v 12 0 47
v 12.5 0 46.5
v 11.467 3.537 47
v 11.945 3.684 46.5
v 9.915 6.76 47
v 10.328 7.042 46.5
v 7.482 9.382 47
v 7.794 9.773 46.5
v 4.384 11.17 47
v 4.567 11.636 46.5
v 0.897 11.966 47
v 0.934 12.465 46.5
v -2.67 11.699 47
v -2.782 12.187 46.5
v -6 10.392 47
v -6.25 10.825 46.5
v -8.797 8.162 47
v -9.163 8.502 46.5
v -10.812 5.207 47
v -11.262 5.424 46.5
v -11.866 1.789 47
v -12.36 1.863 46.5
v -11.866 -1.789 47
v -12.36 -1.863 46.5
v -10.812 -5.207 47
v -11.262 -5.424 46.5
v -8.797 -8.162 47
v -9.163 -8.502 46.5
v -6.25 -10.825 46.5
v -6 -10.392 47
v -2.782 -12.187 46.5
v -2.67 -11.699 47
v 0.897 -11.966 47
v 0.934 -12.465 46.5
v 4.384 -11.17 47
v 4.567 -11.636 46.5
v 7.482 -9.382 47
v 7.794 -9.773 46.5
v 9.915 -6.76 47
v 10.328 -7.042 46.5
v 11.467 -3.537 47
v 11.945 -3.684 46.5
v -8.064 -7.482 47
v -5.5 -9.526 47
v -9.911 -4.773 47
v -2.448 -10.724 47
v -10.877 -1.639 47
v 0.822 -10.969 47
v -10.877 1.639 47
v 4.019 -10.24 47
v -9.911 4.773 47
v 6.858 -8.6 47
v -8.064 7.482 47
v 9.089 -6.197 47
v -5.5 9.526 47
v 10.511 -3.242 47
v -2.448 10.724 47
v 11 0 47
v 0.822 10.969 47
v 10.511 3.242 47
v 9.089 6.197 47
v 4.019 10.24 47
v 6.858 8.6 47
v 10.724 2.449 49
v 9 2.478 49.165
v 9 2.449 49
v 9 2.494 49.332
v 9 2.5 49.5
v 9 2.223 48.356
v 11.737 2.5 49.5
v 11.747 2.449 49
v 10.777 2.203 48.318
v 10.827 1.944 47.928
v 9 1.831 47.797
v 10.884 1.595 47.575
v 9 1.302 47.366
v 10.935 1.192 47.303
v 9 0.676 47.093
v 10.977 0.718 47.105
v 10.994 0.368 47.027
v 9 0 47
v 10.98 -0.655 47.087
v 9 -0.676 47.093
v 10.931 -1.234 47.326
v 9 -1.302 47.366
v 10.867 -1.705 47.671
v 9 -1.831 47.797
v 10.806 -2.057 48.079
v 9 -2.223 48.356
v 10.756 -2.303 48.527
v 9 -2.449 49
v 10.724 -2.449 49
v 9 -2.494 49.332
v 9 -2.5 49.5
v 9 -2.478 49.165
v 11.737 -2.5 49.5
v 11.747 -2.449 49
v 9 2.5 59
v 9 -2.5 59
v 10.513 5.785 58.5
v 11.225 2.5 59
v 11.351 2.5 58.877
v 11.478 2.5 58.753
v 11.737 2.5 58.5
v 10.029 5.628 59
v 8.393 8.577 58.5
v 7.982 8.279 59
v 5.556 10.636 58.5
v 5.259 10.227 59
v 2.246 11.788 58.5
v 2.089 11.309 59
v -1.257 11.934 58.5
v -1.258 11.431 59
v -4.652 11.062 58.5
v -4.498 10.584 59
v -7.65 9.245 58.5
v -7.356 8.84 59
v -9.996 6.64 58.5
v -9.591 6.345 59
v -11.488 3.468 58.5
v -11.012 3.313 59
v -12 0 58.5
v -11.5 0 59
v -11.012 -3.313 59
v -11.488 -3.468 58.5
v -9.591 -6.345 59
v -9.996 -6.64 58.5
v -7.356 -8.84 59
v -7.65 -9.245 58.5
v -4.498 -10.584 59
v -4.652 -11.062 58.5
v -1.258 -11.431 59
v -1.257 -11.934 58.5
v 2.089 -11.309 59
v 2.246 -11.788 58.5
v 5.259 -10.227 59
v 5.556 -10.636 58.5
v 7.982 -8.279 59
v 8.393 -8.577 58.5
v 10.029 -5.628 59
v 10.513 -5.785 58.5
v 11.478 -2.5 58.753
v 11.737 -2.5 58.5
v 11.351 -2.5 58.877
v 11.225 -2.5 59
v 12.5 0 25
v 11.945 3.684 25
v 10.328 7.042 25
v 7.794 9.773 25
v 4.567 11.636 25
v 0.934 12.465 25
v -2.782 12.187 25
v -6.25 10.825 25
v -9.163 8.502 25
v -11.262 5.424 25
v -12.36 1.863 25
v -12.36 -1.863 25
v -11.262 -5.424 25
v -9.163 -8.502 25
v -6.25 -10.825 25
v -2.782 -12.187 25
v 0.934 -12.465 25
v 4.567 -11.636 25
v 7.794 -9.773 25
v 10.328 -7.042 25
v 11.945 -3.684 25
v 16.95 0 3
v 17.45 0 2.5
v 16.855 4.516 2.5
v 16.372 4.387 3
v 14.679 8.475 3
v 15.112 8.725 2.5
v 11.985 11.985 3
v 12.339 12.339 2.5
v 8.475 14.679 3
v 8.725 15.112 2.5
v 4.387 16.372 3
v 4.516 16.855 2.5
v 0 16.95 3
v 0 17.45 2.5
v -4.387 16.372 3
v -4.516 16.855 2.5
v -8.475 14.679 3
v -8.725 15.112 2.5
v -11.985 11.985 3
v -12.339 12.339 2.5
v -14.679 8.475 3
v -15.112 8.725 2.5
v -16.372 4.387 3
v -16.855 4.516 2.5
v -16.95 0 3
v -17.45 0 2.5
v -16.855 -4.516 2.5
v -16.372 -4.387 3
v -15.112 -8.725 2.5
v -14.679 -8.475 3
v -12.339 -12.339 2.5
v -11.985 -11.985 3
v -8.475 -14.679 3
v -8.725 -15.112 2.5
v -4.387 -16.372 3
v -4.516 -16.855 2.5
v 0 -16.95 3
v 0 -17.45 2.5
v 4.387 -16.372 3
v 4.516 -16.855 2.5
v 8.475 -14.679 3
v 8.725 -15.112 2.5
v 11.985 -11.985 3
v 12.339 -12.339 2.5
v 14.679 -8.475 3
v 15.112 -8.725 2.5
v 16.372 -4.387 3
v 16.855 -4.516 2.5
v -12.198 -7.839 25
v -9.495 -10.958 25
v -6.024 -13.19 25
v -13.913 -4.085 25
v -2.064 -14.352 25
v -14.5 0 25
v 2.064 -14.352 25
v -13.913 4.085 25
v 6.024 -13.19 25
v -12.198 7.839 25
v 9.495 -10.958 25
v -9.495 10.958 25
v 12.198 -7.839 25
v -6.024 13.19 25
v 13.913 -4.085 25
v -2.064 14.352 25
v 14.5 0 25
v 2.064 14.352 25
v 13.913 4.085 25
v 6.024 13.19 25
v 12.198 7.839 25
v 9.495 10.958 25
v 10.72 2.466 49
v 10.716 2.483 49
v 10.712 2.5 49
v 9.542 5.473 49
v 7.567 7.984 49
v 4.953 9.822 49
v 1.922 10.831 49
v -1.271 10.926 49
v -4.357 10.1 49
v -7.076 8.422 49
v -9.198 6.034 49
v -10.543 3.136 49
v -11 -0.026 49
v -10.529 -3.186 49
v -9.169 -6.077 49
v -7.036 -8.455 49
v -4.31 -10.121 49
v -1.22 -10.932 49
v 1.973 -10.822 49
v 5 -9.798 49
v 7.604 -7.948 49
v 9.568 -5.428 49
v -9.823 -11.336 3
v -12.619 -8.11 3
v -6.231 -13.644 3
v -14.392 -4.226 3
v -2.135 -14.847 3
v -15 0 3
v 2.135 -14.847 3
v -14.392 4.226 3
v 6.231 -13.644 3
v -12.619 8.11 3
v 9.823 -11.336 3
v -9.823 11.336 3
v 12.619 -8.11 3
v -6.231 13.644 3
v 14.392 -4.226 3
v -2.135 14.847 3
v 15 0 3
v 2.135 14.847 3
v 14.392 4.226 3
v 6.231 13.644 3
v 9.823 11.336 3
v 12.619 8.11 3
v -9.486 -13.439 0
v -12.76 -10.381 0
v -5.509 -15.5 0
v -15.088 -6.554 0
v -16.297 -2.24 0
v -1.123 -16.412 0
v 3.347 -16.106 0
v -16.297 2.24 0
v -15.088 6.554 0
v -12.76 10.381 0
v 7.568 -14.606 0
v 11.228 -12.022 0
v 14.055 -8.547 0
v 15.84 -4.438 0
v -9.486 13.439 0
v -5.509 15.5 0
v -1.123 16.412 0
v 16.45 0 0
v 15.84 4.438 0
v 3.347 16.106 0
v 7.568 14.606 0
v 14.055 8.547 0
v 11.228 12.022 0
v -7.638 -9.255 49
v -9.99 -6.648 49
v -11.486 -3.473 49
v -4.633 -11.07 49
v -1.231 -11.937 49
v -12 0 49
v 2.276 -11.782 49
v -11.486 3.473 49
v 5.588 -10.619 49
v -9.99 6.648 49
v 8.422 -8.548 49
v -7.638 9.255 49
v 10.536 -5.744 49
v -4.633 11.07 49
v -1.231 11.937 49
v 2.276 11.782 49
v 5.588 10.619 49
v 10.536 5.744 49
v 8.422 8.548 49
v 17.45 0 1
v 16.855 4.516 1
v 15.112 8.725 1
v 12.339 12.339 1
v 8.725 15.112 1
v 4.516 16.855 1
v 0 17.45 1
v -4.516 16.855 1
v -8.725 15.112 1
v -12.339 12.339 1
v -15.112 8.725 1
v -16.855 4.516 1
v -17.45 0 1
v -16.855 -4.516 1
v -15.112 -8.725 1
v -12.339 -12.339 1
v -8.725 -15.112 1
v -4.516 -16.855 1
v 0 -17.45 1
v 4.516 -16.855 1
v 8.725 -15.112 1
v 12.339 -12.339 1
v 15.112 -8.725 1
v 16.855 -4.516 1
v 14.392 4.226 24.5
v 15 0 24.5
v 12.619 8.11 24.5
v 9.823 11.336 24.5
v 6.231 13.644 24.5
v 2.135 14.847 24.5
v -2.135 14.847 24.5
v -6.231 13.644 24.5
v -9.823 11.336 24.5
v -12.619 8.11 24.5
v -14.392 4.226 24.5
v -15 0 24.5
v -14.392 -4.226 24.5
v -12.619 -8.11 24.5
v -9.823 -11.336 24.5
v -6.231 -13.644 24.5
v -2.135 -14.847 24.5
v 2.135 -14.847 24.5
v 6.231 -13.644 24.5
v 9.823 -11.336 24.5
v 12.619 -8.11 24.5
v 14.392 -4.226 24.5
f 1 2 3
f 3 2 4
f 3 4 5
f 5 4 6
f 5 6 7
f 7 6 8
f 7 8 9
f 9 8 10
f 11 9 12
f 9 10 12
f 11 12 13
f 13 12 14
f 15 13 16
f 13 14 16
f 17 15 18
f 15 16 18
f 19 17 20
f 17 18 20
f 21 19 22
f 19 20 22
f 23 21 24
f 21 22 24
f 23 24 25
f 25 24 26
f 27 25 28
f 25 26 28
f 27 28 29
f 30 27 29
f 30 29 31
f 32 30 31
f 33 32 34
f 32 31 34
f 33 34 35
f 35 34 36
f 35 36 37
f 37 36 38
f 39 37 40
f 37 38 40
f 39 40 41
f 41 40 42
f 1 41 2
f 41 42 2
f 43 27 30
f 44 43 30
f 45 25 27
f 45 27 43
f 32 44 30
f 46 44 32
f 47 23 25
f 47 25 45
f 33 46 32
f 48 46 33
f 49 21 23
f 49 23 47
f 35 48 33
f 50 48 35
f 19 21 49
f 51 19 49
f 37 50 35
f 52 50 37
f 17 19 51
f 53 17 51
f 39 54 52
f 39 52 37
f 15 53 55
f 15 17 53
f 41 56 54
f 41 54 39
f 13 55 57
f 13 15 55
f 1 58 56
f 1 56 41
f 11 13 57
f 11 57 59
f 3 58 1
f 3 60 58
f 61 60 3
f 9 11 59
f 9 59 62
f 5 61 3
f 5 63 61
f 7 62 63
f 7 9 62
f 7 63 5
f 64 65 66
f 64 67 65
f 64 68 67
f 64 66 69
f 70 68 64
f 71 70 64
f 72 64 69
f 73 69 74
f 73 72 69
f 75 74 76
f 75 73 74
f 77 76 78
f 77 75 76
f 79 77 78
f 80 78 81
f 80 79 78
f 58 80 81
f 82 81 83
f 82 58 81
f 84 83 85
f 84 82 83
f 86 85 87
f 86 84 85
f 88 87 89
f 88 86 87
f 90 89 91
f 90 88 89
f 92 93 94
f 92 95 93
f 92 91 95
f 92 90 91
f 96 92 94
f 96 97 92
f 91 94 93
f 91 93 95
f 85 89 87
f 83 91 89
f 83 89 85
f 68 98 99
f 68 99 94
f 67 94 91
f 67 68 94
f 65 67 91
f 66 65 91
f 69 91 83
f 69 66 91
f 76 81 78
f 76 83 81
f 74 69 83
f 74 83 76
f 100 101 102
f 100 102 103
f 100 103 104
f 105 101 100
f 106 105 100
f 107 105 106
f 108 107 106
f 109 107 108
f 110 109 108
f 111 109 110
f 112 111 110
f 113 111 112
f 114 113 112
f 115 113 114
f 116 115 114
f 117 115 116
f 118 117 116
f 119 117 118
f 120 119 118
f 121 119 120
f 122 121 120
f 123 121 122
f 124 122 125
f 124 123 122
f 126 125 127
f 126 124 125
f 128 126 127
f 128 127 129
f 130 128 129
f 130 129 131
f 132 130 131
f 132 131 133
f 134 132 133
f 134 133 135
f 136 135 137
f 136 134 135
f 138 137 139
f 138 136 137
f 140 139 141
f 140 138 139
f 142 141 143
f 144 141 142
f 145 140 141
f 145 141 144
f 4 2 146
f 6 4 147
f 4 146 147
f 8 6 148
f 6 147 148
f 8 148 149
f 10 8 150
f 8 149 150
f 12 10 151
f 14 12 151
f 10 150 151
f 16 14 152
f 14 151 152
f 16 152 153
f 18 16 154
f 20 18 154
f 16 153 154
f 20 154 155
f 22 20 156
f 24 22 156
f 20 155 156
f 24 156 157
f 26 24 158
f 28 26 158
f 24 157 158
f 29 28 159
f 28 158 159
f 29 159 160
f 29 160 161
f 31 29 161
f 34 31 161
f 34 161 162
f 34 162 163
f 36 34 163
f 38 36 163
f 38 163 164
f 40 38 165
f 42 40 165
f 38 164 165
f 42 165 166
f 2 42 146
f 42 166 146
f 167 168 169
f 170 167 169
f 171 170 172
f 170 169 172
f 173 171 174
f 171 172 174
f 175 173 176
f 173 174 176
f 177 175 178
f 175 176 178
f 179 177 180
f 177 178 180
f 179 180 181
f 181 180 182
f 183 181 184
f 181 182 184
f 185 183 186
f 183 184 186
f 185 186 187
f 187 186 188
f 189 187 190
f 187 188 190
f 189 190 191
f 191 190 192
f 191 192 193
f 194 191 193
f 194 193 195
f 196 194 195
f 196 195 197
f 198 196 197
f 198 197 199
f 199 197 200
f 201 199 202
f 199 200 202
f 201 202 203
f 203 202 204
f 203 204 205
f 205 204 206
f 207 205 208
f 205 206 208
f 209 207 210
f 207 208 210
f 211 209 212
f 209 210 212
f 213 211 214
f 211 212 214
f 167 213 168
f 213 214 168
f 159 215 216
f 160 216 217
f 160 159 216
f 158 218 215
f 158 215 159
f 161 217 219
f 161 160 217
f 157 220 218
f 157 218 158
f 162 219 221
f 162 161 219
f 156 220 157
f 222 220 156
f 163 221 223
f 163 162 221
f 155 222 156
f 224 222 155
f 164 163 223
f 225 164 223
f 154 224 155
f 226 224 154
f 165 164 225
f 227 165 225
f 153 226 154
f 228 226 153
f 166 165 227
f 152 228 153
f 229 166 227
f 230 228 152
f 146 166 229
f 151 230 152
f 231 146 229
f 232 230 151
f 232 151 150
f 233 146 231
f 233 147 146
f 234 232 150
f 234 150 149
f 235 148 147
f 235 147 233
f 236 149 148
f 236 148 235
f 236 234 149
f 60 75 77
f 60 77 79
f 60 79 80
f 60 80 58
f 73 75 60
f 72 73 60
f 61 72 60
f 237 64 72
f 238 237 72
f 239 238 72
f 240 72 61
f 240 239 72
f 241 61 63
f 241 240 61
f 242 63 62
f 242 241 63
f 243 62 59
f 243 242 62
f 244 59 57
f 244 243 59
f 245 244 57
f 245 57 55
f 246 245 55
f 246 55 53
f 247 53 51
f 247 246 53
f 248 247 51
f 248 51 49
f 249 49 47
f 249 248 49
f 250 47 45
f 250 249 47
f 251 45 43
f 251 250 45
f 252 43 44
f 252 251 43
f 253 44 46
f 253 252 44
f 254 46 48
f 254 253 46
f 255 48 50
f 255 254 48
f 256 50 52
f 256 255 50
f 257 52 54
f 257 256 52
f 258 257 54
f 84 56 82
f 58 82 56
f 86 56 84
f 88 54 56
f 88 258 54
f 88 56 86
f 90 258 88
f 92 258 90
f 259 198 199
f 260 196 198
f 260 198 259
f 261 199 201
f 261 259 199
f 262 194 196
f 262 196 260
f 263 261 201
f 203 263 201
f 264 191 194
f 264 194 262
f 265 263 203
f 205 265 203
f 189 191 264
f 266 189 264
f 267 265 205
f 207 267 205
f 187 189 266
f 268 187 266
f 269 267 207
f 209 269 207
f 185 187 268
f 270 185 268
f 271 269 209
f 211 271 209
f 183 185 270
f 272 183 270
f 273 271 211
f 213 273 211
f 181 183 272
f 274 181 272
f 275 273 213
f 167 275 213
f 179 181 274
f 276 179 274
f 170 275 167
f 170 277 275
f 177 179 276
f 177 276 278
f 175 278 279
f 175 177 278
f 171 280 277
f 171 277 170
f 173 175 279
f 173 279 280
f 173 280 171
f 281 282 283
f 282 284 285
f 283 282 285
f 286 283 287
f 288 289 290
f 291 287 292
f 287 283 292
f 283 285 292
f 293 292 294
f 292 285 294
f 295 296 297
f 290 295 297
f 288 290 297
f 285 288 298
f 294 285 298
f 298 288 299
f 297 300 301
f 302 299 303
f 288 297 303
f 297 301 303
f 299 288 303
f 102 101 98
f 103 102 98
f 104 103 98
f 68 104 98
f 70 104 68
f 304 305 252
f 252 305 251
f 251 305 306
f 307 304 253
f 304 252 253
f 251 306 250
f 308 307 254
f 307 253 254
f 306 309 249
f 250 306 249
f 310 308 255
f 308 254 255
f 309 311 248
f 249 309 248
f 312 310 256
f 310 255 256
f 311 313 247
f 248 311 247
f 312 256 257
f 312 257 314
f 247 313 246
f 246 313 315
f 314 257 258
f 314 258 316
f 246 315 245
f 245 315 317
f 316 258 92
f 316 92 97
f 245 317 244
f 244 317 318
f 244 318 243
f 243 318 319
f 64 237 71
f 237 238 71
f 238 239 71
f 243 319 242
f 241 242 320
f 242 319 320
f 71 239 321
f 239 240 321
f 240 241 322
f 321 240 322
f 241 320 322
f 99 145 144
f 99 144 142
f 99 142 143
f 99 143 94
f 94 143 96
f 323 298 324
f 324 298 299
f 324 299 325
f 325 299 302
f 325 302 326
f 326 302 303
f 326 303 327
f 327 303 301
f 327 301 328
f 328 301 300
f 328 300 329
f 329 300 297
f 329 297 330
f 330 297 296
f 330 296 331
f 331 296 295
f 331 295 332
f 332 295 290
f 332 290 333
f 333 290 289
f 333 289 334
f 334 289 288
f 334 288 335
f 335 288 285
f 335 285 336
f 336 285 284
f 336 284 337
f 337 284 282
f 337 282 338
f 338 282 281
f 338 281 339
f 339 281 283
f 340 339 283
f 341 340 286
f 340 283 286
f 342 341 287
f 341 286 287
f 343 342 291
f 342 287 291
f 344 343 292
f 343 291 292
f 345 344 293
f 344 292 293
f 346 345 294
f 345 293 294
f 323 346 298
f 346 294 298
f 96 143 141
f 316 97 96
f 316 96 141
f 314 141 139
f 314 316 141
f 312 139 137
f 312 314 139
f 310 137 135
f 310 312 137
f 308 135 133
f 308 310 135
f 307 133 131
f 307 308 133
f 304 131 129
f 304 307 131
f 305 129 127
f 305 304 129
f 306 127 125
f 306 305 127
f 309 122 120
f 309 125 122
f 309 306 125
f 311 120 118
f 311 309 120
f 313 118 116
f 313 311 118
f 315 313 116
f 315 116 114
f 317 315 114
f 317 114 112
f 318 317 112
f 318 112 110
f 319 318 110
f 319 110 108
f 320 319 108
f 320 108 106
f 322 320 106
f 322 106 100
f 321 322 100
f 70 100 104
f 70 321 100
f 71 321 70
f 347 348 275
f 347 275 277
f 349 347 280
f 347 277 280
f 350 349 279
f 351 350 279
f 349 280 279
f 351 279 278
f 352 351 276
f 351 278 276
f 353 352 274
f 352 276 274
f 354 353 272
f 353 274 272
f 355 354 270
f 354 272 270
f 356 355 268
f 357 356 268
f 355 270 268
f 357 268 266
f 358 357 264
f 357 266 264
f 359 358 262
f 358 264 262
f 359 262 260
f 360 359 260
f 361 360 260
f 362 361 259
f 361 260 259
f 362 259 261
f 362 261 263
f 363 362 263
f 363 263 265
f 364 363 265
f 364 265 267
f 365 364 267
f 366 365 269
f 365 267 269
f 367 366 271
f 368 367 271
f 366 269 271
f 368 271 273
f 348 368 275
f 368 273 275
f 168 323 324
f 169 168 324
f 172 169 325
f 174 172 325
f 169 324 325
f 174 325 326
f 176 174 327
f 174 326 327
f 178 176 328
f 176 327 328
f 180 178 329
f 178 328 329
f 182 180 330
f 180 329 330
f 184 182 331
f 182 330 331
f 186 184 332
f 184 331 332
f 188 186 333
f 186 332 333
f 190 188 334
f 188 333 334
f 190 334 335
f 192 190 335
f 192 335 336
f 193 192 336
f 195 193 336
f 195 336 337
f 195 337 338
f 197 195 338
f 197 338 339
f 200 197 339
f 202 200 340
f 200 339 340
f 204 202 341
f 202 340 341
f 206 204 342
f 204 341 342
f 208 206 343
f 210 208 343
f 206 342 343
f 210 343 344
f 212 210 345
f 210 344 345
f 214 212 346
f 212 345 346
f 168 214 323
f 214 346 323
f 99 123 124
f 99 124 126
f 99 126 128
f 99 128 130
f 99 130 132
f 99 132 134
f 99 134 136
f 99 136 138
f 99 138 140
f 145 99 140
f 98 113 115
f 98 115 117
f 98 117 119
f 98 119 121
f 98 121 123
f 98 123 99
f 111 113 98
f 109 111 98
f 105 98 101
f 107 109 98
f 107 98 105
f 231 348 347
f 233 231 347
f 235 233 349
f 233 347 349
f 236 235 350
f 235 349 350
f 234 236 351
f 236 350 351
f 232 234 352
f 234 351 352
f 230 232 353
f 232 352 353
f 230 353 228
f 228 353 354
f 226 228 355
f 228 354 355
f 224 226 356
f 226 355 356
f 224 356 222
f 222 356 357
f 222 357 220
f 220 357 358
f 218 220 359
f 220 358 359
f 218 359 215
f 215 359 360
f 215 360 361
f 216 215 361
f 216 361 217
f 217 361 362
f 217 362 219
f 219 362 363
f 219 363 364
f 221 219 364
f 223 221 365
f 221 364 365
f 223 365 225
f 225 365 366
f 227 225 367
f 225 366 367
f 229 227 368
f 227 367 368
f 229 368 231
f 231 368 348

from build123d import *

# Parameters (mm, degrees)
SKETCH_1_R          = 17.45
EXTRUDE_1_DEPTH     = 3
SKETCH_2_R          = 15
EXTRUDE_2_DEPTH     = 22
SKETCH_4_R          = 12.5
EXTRUDE_3_DEPTH     = 22
SKETCH_5_R          = 12
EXTRUDE_4_DEPTH     = 12
CHAMFER_1_SIZE      = 0.5
SKETCH_6_W          = 1
SKETCH_6_H          = 2
CHAMFER_2_SIZE      = 0.5
CHAMFER_3_SIZE      = 1
SKETCH_7_W          = 12
SKETCH_7_H          = 5
CUT_EXTRUDE_1_DEPTH = 3
FILLET_1_R          = 2.5


with BuildPart() as part:
    # 草图1 → 拉伸1 (new body)
    with BuildSketch(Plane.XY):
        Circle(SKETCH_1_R)
    extrude(amount=EXTRUDE_1_DEPTH)

    # 草图2 → 拉伸2 (add)
    with BuildSketch(Plane.XY.offset(3)):
        Circle(SKETCH_2_R)
    extrude(amount=EXTRUDE_2_DEPTH)

    # 草图4 → 拉伸3 (add)
    with BuildSketch(Plane.XY.offset(25)):
        Circle(SKETCH_4_R)
    extrude(amount=EXTRUDE_3_DEPTH)

    # 草图5 → 拉伸4 (add)
    with BuildSketch(Plane.XY.offset(47)):
        Circle(SKETCH_5_R)
    extrude(amount=EXTRUDE_4_DEPTH)

    # 倒角1
    chamfer_1_edges = [part.edges().sort_by_distance(p)[0] for p in [
        (-12, 0, 59),
    ]]
    chamfer(chamfer_1_edges, length=CHAMFER_1_SIZE)

    # 草图6 → 切除-旋转1 (revolve, cut)
    with BuildSketch(Plane(origin=(0, 0, 0), x_dir=(1, 0, 0), z_dir=(0, 1, 0)), mode=Mode.PRIVATE) as cut_revolve_1_sk:
        with Locations((-11.5, -48)):
            Rectangle(SKETCH_6_W, SKETCH_6_H)
    revolve(cut_revolve_1_sk.sketch.rotate(Axis((0, 0, 47), (0, 0, -1)), 180), axis=Axis((0, 0, 47), (0, 0, -1)), mode=Mode.SUBTRACT)

    # 倒角2
    chamfer_2_edges = [part.edges().sort_by_distance(p)[0] for p in [
        (-12.5, 0, 47),
        (-17.45, 0, 3),
        (-15, 0, 25),
    ]]
    chamfer(chamfer_2_edges, length=CHAMFER_2_SIZE)

    # 倒角3
    chamfer_3_edges = [part.edges().sort_by_distance(p)[0] for p in [
        (-17.45, 0, 0),
    ]]
    chamfer(chamfer_3_edges, length=CHAMFER_3_SIZE)

    # 草图7 → 切除-拉伸1 (cut)
    with BuildSketch(Plane(origin=(12, 0, 0), x_dir=(0, 0, -1), z_dir=(1, 0, 0))):
        with Locations((-53, 0)):
            Rectangle(SKETCH_7_W, SKETCH_7_H)
    extrude(amount=-CUT_EXTRUDE_1_DEPTH, mode=Mode.SUBTRACT)

    # 圆角1
    # the kernel refuses this fillet: 2.5 mm, written as the material it adds along each edge
    with BuildSketch(Plane(origin=(16.962142643, -2.5, 47), x_dir=(0, 1, 0), z_dir=(-1, 0, 0))) as fillet_1_piece_1_section:
        with BuildLine():
            CenterArc((FILLET_1_R, -FILLET_1_R), FILLET_1_R, 90, 90)
            Line((0, -FILLET_1_R), (0, 0))
            Line((0, 0), (FILLET_1_R, 0))
        make_face()
    fillet_1_piece_1 = extrude(amount=14.212142643, mode=Mode.PRIVATE)
    fillet_1_piece_1 = fillet_1_piece_1 & Plane(origin=(0, 0, 49.124758418), x_dir=(1, 0, 0), z_dir=(0, 0, -1)) * Cylinder(12, 39, mode=Mode.PRIVATE)
    fillet_1_piece_1 = split(fillet_1_piece_1, bisect_by=Plane(origin=(11.227777132, -2.484876178, 49), z_dir=(0, 0, 1)), keep=Keep.TOP, mode=Mode.PRIVATE)
    add(fillet_1_piece_1)
    with BuildSketch(Plane(origin=(16.962142643, -2.5, 47), x_dir=(0, 1, 0), z_dir=(-1, 0, 0))) as fillet_1_piece_2_section:
        with BuildLine():
            CenterArc((FILLET_1_R, -FILLET_1_R), FILLET_1_R, 90, 90)
            Line((0, -FILLET_1_R), (0, 0))
            Line((0, 0), (FILLET_1_R, 0))
        make_face()
    fillet_1_piece_2 = extrude(amount=14.212142643, mode=Mode.PRIVATE)
    fillet_1_piece_2 = fillet_1_piece_2 & Plane(origin=(0, 0, 48.528388409), x_dir=(1, 0, 0), z_dir=(0, 0, 1)) * Cylinder(11, 39, mode=Mode.PRIVATE)
    add(fillet_1_piece_2)
    with BuildSketch(Plane(origin=(16.962142643, 2.5, 47), x_dir=(0, -1, 0), z_dir=(-1, 0, 0))) as fillet_1_piece_3_section:
        with BuildLine():
            CenterArc((FILLET_1_R, FILLET_1_R), FILLET_1_R, 180, 90)
            Line((0, FILLET_1_R), (0, 0))
            Line((0, 0), (FILLET_1_R, 0))
        make_face()
    fillet_1_piece_3 = extrude(amount=14.212142643, mode=Mode.PRIVATE)
    fillet_1_piece_3 = fillet_1_piece_3 & Plane(origin=(0, 0, 49.124758418), x_dir=(1, 0, 0), z_dir=(0, 0, -1)) * Cylinder(12, 39, mode=Mode.PRIVATE)
    fillet_1_piece_3 = split(fillet_1_piece_3, bisect_by=Plane(origin=(11.227777136, 2.484876178, 49), z_dir=(0, 0, 1)), keep=Keep.TOP, mode=Mode.PRIVATE)
    add(fillet_1_piece_3)
    with BuildSketch(Plane(origin=(16.962142643, 2.5, 47), x_dir=(0, -1, 0), z_dir=(-1, 0, 0))) as fillet_1_piece_4_section:
        with BuildLine():
            CenterArc((FILLET_1_R, FILLET_1_R), FILLET_1_R, 180, 90)
            Line((0, FILLET_1_R), (0, 0))
            Line((0, 0), (FILLET_1_R, 0))
        make_face()
    fillet_1_piece_4 = extrude(amount=14.212142643, mode=Mode.PRIVATE)
    fillet_1_piece_4 = fillet_1_piece_4 & Plane(origin=(0, 0, 48.5283884), x_dir=(1, 0, 0), z_dir=(0, 0, 1)) * Cylinder(11, 39, mode=Mode.PRIVATE)
    add(fillet_1_piece_4)


solid = part.part
